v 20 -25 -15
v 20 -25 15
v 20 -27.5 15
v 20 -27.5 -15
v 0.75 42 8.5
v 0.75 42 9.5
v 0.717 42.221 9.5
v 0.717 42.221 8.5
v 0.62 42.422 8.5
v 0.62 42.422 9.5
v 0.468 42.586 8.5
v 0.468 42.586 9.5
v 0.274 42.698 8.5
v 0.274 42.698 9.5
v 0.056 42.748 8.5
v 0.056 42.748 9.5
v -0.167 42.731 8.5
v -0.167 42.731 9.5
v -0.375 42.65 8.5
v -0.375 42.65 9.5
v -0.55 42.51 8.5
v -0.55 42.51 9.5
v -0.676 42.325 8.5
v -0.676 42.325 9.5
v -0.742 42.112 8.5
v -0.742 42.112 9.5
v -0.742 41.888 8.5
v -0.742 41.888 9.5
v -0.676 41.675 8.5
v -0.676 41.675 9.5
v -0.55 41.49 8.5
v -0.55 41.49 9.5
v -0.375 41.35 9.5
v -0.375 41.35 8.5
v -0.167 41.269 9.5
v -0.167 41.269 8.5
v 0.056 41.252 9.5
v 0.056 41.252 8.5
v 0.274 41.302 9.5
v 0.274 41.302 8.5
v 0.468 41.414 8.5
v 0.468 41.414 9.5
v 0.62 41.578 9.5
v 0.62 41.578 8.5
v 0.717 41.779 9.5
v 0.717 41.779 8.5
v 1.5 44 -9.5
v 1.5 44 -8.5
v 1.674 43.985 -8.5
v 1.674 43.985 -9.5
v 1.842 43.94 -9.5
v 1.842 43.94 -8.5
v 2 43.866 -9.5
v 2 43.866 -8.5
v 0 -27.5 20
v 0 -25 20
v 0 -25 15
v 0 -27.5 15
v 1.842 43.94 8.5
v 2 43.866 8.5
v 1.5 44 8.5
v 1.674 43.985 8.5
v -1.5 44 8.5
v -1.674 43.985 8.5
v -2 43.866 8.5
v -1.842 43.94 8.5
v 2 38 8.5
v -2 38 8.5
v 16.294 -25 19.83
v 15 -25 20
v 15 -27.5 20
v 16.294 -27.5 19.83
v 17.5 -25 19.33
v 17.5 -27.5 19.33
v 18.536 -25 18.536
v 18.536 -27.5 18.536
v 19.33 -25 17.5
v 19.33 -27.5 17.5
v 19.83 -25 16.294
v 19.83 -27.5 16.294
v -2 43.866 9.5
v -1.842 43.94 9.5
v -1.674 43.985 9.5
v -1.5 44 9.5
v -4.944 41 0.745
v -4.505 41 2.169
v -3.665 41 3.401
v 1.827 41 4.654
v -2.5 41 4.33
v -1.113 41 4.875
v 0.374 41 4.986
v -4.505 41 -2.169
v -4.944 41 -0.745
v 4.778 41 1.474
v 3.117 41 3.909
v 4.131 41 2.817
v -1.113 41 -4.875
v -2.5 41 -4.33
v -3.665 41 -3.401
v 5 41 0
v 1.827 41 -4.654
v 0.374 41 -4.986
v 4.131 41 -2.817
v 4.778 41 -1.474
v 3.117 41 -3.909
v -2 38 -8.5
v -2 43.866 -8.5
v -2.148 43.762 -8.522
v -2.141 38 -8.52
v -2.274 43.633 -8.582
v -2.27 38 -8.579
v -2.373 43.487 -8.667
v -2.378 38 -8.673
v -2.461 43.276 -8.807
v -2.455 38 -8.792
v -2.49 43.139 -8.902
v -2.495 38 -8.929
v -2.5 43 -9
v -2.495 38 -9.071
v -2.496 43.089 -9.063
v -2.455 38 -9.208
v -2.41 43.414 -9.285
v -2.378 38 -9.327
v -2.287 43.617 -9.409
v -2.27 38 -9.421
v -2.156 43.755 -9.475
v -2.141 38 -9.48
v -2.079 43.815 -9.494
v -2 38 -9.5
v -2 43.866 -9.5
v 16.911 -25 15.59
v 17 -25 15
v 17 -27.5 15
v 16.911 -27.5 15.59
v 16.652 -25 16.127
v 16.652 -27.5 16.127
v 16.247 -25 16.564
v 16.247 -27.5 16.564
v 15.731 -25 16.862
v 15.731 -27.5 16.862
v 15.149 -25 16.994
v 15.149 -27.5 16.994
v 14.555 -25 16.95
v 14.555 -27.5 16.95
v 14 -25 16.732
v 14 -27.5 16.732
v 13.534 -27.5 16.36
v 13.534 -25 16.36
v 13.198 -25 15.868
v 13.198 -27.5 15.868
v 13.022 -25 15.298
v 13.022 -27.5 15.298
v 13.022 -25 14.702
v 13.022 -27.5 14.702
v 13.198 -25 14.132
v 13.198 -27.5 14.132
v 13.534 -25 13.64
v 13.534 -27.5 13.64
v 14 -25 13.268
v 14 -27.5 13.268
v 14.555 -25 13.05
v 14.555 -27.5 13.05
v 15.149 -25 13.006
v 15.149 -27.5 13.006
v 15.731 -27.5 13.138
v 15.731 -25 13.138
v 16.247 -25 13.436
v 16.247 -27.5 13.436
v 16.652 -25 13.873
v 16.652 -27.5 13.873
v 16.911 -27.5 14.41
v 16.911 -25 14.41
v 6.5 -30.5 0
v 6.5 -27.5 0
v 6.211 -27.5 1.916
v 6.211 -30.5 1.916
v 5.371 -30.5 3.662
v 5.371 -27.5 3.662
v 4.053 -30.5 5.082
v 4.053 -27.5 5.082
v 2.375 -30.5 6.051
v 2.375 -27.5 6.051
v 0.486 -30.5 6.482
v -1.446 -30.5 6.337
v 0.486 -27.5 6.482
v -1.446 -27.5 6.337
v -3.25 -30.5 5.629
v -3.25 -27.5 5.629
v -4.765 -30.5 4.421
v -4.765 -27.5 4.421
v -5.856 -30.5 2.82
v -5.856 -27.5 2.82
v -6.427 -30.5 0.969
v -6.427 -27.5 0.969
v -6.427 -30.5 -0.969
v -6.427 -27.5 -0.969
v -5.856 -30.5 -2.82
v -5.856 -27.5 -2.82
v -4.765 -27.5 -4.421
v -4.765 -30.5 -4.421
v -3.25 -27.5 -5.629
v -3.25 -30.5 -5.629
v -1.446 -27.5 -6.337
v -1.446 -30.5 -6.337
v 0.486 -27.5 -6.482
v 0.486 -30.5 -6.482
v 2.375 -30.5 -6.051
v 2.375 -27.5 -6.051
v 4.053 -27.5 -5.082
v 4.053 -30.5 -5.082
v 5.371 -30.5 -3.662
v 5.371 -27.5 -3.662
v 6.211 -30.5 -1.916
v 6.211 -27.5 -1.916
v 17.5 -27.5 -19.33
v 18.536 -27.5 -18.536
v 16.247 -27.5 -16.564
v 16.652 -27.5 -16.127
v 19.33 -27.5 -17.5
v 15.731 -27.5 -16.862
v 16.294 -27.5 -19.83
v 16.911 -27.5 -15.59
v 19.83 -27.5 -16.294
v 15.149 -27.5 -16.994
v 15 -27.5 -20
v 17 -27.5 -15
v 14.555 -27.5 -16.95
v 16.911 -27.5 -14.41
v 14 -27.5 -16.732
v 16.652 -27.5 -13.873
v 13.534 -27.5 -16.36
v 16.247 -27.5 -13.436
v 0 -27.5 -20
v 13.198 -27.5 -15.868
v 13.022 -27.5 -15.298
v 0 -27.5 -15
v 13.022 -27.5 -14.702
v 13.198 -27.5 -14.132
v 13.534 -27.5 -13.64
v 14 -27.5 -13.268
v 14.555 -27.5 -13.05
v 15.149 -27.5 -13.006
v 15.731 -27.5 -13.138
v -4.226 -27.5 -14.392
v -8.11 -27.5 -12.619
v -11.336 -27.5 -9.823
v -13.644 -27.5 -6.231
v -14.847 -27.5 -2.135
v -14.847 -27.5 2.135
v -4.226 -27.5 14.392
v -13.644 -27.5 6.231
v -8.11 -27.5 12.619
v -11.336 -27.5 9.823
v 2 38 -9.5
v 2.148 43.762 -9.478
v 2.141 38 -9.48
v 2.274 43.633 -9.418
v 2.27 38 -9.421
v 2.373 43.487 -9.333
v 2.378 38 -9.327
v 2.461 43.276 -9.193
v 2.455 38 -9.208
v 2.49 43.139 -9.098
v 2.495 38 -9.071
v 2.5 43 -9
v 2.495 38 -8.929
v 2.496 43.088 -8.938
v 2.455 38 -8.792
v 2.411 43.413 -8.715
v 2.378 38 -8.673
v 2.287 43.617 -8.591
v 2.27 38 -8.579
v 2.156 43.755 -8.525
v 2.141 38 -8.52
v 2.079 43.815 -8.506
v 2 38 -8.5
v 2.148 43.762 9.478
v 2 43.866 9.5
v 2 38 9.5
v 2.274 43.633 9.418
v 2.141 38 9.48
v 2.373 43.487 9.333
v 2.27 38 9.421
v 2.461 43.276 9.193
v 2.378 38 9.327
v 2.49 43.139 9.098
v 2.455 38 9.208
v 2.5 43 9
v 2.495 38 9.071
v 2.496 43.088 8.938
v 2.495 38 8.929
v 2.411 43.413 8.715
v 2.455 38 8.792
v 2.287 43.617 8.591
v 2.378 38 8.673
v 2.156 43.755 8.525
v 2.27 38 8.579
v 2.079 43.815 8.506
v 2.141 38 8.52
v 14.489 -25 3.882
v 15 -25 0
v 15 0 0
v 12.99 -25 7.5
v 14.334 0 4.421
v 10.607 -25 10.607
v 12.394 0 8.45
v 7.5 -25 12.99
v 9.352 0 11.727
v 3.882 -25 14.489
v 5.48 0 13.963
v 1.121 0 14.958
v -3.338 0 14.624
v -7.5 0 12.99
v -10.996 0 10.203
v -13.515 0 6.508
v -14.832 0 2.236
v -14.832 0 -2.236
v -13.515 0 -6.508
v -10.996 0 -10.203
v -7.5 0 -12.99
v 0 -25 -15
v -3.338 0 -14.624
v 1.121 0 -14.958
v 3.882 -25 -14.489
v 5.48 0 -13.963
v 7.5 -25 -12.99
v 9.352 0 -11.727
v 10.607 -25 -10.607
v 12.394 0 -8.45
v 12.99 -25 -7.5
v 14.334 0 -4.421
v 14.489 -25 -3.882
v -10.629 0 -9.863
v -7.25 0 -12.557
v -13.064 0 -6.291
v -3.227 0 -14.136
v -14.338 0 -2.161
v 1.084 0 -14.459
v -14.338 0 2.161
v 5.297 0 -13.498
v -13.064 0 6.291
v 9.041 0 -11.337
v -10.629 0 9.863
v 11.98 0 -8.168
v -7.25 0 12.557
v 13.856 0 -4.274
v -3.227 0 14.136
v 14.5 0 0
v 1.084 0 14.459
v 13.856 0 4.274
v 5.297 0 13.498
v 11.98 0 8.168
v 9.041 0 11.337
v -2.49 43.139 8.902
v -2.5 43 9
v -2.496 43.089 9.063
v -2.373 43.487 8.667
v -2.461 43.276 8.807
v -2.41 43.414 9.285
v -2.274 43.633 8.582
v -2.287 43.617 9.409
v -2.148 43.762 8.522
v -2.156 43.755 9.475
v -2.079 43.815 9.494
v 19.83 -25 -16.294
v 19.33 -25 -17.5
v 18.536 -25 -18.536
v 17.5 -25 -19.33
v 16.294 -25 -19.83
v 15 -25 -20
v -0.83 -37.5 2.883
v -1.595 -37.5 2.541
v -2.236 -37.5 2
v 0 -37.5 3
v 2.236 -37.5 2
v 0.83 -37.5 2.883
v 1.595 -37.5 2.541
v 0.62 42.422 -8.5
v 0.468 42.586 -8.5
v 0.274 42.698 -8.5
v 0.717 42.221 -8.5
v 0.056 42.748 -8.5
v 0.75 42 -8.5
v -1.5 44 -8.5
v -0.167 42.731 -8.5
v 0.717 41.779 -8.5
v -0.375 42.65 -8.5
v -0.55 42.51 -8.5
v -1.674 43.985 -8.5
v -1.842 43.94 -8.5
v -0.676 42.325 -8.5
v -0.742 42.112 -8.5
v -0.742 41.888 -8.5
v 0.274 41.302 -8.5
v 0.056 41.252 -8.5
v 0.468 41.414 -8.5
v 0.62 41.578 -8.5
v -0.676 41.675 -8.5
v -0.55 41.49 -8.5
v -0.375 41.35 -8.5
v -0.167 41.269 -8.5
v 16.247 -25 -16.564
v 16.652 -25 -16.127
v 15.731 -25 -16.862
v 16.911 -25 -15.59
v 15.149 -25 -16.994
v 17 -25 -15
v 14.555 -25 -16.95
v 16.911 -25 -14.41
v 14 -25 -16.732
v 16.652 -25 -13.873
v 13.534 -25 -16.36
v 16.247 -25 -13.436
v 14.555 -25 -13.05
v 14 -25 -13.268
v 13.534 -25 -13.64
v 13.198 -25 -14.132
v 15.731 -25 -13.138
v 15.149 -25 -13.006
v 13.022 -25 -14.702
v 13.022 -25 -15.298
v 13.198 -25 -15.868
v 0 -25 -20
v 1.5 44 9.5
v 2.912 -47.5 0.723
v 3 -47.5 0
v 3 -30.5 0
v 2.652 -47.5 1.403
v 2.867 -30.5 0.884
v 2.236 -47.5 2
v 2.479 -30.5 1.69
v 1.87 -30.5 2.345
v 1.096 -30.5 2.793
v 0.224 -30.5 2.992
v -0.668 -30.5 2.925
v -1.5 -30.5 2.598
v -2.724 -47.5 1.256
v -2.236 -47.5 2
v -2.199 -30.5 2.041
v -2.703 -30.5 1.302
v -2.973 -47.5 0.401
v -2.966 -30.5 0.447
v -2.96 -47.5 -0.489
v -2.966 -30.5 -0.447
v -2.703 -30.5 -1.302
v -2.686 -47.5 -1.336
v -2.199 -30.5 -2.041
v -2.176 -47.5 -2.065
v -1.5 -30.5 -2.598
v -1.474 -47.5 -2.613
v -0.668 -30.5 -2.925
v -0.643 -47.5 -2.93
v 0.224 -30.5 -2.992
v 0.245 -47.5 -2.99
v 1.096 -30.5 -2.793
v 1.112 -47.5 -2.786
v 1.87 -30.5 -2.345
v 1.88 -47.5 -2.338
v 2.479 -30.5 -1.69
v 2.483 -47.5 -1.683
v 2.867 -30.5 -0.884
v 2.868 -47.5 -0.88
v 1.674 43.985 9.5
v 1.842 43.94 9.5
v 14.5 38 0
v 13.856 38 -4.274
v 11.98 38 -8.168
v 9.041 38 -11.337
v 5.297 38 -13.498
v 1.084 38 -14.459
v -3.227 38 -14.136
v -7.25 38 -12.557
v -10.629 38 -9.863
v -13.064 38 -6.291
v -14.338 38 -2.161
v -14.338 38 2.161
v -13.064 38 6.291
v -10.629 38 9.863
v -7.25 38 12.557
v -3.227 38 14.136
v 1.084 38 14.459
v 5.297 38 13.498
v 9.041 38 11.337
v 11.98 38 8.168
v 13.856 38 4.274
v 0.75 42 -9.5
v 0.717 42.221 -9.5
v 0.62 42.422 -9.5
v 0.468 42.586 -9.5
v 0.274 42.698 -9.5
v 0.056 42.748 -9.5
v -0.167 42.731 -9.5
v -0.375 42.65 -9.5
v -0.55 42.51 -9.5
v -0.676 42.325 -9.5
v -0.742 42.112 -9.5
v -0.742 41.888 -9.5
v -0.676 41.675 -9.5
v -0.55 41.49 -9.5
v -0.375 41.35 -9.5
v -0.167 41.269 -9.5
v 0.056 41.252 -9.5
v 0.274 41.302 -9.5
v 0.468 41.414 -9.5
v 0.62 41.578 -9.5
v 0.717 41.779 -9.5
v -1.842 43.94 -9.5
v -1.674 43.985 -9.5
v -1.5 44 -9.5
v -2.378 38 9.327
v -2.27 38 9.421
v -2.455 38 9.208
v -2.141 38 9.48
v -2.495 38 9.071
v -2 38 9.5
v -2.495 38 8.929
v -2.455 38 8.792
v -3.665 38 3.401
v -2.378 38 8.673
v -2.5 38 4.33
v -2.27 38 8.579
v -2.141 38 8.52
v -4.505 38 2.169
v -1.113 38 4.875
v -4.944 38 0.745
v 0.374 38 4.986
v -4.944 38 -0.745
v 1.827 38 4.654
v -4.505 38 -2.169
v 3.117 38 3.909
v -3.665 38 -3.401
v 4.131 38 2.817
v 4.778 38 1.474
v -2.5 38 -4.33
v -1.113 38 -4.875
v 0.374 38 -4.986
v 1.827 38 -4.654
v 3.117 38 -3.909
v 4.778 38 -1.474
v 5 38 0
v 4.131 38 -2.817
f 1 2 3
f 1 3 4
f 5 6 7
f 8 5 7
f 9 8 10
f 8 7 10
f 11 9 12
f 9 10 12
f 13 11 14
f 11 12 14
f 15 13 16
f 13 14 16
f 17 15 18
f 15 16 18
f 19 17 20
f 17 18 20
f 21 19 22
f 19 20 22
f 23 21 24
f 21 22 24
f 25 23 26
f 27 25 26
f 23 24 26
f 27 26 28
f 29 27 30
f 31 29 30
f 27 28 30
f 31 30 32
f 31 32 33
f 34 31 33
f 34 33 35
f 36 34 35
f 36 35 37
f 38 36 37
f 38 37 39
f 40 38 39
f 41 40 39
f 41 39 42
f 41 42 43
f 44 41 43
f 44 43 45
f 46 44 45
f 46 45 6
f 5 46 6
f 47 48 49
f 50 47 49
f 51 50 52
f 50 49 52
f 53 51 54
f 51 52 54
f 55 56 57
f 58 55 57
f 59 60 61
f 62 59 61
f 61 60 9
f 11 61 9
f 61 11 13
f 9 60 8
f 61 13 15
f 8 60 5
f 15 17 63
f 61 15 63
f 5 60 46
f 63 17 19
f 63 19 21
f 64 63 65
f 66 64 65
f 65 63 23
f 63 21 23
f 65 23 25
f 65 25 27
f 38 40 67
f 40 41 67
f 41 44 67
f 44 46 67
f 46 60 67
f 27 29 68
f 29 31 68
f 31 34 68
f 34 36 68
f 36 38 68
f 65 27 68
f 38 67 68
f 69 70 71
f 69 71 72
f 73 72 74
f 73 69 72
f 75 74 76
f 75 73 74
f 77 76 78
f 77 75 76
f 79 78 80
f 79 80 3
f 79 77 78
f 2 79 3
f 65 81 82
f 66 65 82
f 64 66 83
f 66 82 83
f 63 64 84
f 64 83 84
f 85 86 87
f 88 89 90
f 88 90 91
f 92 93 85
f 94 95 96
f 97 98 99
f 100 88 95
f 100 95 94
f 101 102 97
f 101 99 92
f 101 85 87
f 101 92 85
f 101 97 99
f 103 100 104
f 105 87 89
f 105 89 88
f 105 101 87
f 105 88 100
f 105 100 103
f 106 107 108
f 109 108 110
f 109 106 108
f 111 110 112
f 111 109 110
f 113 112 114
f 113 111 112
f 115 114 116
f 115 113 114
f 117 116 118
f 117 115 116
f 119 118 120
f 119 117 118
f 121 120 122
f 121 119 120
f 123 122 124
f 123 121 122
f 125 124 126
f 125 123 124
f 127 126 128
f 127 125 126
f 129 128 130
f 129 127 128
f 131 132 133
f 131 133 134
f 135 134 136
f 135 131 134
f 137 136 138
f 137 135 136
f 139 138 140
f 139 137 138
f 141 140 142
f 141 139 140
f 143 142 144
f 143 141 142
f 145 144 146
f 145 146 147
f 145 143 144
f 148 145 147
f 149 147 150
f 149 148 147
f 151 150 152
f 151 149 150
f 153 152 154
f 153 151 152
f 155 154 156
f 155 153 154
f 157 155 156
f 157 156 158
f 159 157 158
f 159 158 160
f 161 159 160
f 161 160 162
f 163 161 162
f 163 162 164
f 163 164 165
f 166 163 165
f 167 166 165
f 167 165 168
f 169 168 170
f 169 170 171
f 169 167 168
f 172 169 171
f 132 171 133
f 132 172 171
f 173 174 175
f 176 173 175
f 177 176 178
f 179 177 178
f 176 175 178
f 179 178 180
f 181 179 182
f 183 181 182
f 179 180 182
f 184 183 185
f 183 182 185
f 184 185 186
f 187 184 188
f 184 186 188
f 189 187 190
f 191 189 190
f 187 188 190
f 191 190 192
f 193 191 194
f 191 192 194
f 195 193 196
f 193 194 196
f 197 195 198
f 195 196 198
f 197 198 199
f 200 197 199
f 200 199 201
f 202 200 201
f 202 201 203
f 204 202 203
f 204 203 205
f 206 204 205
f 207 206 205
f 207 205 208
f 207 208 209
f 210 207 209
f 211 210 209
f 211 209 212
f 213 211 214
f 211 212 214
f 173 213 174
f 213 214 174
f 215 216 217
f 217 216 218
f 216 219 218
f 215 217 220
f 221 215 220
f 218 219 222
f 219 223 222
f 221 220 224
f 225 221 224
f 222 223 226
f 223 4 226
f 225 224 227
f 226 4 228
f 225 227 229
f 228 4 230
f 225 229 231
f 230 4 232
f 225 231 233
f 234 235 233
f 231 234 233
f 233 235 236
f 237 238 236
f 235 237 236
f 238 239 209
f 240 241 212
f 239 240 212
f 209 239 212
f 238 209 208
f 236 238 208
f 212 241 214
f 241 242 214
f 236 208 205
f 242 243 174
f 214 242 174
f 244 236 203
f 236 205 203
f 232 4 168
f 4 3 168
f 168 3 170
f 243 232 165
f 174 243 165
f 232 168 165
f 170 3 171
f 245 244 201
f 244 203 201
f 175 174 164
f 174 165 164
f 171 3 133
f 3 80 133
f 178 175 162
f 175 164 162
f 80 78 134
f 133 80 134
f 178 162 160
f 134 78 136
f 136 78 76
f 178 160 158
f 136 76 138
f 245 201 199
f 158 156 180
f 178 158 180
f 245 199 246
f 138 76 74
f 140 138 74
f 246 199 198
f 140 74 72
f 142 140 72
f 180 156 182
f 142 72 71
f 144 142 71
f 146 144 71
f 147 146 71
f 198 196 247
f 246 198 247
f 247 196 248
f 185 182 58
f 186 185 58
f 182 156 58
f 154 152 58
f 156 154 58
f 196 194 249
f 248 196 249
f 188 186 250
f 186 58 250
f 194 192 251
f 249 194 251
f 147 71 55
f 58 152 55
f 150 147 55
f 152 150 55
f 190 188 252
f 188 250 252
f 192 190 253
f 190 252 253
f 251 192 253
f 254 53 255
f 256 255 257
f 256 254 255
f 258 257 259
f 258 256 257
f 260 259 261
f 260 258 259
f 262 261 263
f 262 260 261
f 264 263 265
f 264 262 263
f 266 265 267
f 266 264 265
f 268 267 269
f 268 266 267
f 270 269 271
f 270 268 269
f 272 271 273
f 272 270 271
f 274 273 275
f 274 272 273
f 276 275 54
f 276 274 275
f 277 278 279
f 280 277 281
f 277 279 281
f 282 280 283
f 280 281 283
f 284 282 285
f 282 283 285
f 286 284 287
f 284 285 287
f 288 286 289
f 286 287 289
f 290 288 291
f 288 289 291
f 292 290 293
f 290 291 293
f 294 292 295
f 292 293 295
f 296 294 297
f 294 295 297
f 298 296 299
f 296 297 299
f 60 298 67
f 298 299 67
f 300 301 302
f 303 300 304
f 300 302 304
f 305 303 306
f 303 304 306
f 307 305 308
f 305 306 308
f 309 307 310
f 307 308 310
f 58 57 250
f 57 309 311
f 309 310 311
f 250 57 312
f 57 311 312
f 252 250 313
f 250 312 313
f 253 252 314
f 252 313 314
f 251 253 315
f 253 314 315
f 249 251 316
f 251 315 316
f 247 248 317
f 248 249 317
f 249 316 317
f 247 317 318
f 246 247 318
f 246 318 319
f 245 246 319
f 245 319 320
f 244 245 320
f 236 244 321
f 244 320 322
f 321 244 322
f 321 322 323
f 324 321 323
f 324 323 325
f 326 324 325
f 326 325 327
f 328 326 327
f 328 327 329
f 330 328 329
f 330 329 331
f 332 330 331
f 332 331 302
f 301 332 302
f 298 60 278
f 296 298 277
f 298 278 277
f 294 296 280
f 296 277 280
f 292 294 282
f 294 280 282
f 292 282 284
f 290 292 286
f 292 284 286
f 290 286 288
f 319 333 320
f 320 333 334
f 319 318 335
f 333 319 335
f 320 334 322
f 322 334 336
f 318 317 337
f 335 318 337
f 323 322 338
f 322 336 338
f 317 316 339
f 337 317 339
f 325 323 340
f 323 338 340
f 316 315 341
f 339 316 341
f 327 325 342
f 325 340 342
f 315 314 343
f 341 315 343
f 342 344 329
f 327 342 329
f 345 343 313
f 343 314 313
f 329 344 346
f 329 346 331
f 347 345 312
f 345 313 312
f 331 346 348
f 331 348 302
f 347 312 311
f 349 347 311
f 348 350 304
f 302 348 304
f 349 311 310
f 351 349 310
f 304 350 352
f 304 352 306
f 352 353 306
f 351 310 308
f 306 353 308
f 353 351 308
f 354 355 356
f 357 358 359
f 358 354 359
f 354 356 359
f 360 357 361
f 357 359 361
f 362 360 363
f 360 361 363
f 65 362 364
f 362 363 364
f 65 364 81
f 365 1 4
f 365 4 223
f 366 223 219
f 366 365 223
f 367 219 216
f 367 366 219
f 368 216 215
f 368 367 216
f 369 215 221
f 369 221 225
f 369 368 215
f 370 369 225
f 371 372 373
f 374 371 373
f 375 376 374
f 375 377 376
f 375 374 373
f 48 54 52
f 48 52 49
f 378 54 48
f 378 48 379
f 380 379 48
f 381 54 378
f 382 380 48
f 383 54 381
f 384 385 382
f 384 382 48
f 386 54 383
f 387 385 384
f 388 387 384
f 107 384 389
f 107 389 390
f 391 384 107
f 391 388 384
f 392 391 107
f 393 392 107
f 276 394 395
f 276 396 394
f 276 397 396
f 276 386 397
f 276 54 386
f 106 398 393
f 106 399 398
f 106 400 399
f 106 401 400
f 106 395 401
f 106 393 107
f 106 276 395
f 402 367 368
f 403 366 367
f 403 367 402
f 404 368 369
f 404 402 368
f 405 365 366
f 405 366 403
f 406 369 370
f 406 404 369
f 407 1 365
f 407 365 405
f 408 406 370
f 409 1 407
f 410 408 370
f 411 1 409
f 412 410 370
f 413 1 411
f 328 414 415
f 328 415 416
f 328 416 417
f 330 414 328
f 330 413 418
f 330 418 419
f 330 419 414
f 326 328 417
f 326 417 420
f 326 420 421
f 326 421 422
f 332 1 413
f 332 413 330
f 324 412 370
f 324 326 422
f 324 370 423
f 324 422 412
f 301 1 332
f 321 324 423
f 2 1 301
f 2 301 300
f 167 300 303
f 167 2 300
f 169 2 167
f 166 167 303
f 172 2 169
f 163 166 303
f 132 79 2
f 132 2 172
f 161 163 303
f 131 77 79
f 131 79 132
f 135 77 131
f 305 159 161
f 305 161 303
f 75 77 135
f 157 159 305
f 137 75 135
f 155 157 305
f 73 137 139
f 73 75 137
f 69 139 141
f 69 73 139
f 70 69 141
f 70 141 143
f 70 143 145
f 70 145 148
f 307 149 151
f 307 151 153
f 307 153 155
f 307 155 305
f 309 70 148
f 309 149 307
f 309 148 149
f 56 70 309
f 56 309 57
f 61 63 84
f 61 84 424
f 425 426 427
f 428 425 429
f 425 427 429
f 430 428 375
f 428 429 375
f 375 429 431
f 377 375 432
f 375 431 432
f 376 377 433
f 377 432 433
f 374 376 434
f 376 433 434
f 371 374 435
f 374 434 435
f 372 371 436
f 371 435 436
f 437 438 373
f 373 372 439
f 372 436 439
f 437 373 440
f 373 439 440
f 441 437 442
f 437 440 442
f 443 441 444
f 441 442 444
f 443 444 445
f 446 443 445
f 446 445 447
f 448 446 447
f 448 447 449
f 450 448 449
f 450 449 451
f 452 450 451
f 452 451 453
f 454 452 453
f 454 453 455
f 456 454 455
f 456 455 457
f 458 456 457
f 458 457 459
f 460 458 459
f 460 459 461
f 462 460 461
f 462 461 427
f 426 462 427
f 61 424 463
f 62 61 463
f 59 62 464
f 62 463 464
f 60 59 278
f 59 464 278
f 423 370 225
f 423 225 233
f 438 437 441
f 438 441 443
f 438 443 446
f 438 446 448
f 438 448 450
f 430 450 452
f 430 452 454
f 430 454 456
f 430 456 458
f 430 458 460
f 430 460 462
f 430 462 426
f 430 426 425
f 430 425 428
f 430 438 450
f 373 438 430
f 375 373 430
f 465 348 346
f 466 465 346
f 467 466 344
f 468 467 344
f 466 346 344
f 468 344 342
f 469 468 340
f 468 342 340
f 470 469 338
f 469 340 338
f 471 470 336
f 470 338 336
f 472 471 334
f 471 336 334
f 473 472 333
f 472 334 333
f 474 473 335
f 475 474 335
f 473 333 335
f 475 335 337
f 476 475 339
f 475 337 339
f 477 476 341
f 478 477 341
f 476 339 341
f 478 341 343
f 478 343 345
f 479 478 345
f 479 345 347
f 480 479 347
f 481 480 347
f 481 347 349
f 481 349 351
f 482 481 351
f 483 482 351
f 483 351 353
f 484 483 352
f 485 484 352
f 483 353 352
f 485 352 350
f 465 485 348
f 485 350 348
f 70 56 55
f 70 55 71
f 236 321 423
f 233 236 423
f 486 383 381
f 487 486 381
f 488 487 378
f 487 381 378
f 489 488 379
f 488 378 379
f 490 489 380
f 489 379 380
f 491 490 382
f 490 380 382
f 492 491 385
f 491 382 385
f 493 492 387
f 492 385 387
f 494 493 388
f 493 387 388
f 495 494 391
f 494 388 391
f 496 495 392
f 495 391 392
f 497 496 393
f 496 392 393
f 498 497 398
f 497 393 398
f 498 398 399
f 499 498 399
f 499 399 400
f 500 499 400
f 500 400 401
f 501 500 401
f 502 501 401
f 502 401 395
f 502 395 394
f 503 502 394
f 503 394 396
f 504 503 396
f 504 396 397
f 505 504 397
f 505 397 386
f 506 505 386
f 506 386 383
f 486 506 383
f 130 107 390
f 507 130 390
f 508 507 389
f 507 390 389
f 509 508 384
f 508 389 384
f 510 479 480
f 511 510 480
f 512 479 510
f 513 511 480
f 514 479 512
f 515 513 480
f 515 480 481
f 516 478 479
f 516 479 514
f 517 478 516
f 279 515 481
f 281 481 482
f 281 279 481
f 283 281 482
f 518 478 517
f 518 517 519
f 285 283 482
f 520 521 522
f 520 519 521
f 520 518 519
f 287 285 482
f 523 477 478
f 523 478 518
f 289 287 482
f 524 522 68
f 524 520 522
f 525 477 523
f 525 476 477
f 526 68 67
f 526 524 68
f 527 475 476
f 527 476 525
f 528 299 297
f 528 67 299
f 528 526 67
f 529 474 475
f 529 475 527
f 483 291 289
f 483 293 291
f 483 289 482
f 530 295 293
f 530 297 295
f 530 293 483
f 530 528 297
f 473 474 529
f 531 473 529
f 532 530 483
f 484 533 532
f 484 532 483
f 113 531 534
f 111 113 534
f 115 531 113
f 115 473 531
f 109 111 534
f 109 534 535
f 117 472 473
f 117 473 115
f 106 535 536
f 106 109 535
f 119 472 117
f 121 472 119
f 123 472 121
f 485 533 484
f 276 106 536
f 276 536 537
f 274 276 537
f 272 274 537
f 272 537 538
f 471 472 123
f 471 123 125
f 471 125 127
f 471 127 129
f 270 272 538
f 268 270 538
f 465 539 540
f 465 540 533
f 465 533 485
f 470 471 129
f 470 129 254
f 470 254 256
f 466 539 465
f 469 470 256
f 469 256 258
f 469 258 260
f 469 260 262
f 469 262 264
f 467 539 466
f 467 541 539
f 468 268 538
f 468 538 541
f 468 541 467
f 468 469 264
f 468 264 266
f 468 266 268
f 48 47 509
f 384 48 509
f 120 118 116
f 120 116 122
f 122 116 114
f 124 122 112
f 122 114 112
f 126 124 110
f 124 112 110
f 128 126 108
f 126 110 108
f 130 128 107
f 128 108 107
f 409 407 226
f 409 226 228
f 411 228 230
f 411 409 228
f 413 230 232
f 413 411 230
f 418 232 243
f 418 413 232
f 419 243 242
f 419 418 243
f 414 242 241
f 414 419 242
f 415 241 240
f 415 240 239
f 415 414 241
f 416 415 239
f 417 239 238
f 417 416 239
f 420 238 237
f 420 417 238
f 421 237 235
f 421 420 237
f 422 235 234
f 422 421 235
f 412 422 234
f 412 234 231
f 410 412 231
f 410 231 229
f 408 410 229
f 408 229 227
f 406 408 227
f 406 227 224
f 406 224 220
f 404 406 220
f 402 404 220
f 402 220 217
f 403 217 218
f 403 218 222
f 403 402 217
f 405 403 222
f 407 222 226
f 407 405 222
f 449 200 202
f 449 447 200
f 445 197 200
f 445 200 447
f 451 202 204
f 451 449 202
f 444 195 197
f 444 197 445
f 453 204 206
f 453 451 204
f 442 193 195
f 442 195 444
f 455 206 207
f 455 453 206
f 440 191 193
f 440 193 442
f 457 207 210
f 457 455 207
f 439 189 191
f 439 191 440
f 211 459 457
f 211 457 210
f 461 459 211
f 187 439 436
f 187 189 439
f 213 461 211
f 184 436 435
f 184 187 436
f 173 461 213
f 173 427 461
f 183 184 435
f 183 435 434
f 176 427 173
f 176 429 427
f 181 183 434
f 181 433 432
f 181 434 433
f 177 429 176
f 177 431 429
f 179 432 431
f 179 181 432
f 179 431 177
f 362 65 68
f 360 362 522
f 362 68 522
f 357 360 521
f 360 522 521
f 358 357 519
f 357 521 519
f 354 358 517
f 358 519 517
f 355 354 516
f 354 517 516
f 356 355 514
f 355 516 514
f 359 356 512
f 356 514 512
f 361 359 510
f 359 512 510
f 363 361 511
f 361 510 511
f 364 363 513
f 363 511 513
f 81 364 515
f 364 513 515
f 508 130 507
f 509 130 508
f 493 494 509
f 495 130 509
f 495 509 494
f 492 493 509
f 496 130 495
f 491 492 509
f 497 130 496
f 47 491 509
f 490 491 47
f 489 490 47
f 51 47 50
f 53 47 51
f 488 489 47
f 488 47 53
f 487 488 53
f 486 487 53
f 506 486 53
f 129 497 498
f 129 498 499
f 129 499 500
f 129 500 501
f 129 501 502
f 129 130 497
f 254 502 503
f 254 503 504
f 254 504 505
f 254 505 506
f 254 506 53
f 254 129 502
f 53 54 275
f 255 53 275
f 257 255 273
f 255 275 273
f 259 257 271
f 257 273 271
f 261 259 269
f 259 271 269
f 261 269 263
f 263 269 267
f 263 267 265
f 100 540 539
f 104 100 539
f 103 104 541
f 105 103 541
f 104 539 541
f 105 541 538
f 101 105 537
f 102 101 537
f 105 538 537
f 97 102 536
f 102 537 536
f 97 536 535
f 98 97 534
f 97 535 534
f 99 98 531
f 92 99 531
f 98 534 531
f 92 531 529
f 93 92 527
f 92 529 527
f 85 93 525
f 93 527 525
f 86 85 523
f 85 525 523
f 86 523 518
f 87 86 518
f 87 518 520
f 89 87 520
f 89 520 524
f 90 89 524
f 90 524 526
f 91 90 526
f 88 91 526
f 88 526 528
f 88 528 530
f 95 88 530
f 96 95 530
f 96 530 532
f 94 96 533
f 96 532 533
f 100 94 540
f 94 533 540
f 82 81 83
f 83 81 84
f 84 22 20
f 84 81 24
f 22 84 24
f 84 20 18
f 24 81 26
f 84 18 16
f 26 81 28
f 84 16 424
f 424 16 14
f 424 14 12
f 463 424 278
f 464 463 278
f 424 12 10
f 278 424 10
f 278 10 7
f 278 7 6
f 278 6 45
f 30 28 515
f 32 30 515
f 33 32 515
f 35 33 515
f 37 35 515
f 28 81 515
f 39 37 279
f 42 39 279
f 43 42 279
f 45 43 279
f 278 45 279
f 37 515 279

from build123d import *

# Parameters (mm, degrees)
CROQUIS1_R               = 14.5
MOTOR_DEPTH              = 38
CROQUIS2_R               = 5
SALIENTE_POSTERIOR_DEPTH = 3
BORNES_DEPTH             = 6
CROQUIS4_R               = 0.75
AGUJERO_BORNES_DEPTH     = 25
CROQUIS5_R               = 15
CAJA_REDUCTORA_DEPTH     = 25
CROQUIS6_R               = 2
BRIDA_DEPTH              = 2.5
CROQUIS7_R               = 6.5
SALIENTE_EJE_DEPTH       = 3
CROQUIS8_R               = 3
EJE_DEPTH                = 17
CORTE_PLANO_EJE_DEPTH    = 10
CROQUIS10_R              = 2
CORTE_BRIDA_DEPTH        = 10


with BuildPart() as part:
    # Croquis1 → Motor (new body)
    with BuildSketch(Plane(origin=(0, 0, 0), x_dir=(1, 0, 0), z_dir=(0, 1, 0))):
        Circle(CROQUIS1_R)
    extrude(amount=MOTOR_DEPTH)

    # Croquis2 → Saliente posterior (add)
    with BuildSketch(Plane(origin=(0, 38, 0), x_dir=(1, 0, 0), z_dir=(0, 1, 0))):
        Circle(CROQUIS2_R)
    extrude(amount=SALIENTE_POSTERIOR_DEPTH)

    # Croquis3 → Bornes (add)
    with BuildSketch(Plane(origin=(0, 38, 0), x_dir=(1, 0, 0), z_dir=(0, 1, 0))):
        with BuildLine():
            Line((-2, 9.5), (2, 9.5))
            ThreePointArc((2, 9.5), (2.5, 9), (2, 8.5))
            Line((2, 8.5), (-2, 8.5))
            ThreePointArc((-2, 8.5), (-2.5, 9), (-2, 9.5))
        make_face()
        with BuildLine():
            Line((-2, -9.5), (2, -9.5))
            ThreePointArc((2, -9.5), (2.5, -9), (2, -8.5))
            Line((2, -8.5), (-2, -8.5))
            ThreePointArc((-2, -8.5), (-2.5, -9), (-2, -9.5))
        make_face()
    extrude(amount=BORNES_DEPTH)

    # Croquis4 → Agujero Bornes (cut, through all)
    with BuildSketch(Plane.XY.offset(9.5)):
        with Locations((0, 42)):
            Circle(CROQUIS4_R)
        with BuildLine():
            ThreePointArc((2, 43.866025404), (2.366025404, 43.5), (2.5, 43))
            Line((2.5, 43), (2.5, 44))
            Line((2.5, 44), (2, 44))
            Line((2, 44), (2, 43.866025404))
        make_face()
        with BuildLine():
            ThreePointArc((1.5, 44), (1.758819045, 43.965925826), (2, 43.866025404))
            Line((2, 43.866025404), (2, 44))
            Line((2, 44), (1.5, 44))
        make_face()
        with BuildLine():
            Line((-2, 43.866025404), (-2, 44))
            Line((-2, 44), (-2.5, 44))
            Line((-2.5, 44), (-2.5, 43))
            ThreePointArc((-2.5, 43), (-2.366025404, 43.5), (-2, 43.866025404))
        make_face()
        with BuildLine():
            ThreePointArc((-2, 43.866025404), (-1.758819045, 43.965925826), (-1.5, 44))
            Line((-1.5, 44), (-2, 44))
            Line((-2, 44), (-2, 43.866025404))
        make_face()
    extrude(amount=-AGUJERO_BORNES_DEPTH, mode=Mode.SUBTRACT)

    # Croquis5 → Caja reductora (add)
    with BuildSketch(Plane.XZ):
        Circle(CROQUIS5_R)
    extrude(amount=CAJA_REDUCTORA_DEPTH)

    # Croquis6 → Brida (add)
    with BuildSketch(Plane.XZ.offset(25)):
        with BuildLine():
            Line((-15, 20), (15, 20))
            ThreePointArc((15, 20), (18.535533906, 18.535533906), (20, 15))
            Line((20, 15), (20, -15))
            ThreePointArc((20, -15), (18.535533906, -18.535533906), (15, -20))
            Line((15, -20), (-15, -20))
            ThreePointArc((-15, -20), (-18.535533906, -18.535533906), (-20, -15))
            Line((-20, -15), (-20, 15))
            ThreePointArc((-20, 15), (-18.535533906, 18.535533906), (-15, 20))
        make_face()
        with Locations((-15, 15)):
            Circle(CROQUIS6_R, mode=Mode.SUBTRACT)
        with Locations((15, 15)):
            Circle(CROQUIS6_R, mode=Mode.SUBTRACT)
        with Locations((15, -15)):
            Circle(CROQUIS6_R, mode=Mode.SUBTRACT)
        with Locations((-15, -15)):
            Circle(CROQUIS6_R, mode=Mode.SUBTRACT)
    extrude(amount=BRIDA_DEPTH)

    # Croquis7 → Saliente eje (add)
    with BuildSketch(Plane.XZ.offset(27.5)):
        Circle(CROQUIS7_R)
    extrude(amount=SALIENTE_EJE_DEPTH)

    # Croquis8 → Eje (add)
    with BuildSketch(Plane.XZ.offset(30.5)):
        Circle(CROQUIS8_R)
    extrude(amount=EJE_DEPTH)

    # Croquis9 → Corte Plano eje (cut)
    with BuildSketch(Plane.XZ.offset(47.5)):
        Polygon((-74.796206056, 2), (-2.236067977, 2), (2.236067977, 2), (74.796206056, 2), (74.796206056, 147.120276157), (-74.796206056, 147.120276157), align=None)
    extrude(amount=-CORTE_PLANO_EJE_DEPTH, mode=Mode.SUBTRACT)

    # Croquis10 → Corte Brida (cut)
    with BuildSketch(Plane(origin=(0, -25, 0), x_dir=(1, 0, 0), z_dir=(0, 1, 0))):
        with BuildLine():
            Line((0, 15), (0, 20))
            Line((0, 20), (-15, 20))
            ThreePointArc((-15, 20), (-18.535533906, 18.535533906), (-20, 15))
            Line((-20, 15), (-20, -15))
            ThreePointArc((-20, -15), (-18.535533906, -18.535533906), (-15, -20))
            Line((-15, -20), (0, -20))
            Line((0, -20), (0, -15))
            ThreePointArc((0, -15), (-15, 0), (0, 15))
        make_face()
        with Locations((-15, -15)):
            Circle(CROQUIS10_R, mode=Mode.SUBTRACT)
        with Locations((-15, 15)):
            Circle(CROQUIS10_R, mode=Mode.SUBTRACT)
    extrude(amount=-CORTE_BRIDA_DEPTH, mode=Mode.SUBTRACT)


solid = part.part
